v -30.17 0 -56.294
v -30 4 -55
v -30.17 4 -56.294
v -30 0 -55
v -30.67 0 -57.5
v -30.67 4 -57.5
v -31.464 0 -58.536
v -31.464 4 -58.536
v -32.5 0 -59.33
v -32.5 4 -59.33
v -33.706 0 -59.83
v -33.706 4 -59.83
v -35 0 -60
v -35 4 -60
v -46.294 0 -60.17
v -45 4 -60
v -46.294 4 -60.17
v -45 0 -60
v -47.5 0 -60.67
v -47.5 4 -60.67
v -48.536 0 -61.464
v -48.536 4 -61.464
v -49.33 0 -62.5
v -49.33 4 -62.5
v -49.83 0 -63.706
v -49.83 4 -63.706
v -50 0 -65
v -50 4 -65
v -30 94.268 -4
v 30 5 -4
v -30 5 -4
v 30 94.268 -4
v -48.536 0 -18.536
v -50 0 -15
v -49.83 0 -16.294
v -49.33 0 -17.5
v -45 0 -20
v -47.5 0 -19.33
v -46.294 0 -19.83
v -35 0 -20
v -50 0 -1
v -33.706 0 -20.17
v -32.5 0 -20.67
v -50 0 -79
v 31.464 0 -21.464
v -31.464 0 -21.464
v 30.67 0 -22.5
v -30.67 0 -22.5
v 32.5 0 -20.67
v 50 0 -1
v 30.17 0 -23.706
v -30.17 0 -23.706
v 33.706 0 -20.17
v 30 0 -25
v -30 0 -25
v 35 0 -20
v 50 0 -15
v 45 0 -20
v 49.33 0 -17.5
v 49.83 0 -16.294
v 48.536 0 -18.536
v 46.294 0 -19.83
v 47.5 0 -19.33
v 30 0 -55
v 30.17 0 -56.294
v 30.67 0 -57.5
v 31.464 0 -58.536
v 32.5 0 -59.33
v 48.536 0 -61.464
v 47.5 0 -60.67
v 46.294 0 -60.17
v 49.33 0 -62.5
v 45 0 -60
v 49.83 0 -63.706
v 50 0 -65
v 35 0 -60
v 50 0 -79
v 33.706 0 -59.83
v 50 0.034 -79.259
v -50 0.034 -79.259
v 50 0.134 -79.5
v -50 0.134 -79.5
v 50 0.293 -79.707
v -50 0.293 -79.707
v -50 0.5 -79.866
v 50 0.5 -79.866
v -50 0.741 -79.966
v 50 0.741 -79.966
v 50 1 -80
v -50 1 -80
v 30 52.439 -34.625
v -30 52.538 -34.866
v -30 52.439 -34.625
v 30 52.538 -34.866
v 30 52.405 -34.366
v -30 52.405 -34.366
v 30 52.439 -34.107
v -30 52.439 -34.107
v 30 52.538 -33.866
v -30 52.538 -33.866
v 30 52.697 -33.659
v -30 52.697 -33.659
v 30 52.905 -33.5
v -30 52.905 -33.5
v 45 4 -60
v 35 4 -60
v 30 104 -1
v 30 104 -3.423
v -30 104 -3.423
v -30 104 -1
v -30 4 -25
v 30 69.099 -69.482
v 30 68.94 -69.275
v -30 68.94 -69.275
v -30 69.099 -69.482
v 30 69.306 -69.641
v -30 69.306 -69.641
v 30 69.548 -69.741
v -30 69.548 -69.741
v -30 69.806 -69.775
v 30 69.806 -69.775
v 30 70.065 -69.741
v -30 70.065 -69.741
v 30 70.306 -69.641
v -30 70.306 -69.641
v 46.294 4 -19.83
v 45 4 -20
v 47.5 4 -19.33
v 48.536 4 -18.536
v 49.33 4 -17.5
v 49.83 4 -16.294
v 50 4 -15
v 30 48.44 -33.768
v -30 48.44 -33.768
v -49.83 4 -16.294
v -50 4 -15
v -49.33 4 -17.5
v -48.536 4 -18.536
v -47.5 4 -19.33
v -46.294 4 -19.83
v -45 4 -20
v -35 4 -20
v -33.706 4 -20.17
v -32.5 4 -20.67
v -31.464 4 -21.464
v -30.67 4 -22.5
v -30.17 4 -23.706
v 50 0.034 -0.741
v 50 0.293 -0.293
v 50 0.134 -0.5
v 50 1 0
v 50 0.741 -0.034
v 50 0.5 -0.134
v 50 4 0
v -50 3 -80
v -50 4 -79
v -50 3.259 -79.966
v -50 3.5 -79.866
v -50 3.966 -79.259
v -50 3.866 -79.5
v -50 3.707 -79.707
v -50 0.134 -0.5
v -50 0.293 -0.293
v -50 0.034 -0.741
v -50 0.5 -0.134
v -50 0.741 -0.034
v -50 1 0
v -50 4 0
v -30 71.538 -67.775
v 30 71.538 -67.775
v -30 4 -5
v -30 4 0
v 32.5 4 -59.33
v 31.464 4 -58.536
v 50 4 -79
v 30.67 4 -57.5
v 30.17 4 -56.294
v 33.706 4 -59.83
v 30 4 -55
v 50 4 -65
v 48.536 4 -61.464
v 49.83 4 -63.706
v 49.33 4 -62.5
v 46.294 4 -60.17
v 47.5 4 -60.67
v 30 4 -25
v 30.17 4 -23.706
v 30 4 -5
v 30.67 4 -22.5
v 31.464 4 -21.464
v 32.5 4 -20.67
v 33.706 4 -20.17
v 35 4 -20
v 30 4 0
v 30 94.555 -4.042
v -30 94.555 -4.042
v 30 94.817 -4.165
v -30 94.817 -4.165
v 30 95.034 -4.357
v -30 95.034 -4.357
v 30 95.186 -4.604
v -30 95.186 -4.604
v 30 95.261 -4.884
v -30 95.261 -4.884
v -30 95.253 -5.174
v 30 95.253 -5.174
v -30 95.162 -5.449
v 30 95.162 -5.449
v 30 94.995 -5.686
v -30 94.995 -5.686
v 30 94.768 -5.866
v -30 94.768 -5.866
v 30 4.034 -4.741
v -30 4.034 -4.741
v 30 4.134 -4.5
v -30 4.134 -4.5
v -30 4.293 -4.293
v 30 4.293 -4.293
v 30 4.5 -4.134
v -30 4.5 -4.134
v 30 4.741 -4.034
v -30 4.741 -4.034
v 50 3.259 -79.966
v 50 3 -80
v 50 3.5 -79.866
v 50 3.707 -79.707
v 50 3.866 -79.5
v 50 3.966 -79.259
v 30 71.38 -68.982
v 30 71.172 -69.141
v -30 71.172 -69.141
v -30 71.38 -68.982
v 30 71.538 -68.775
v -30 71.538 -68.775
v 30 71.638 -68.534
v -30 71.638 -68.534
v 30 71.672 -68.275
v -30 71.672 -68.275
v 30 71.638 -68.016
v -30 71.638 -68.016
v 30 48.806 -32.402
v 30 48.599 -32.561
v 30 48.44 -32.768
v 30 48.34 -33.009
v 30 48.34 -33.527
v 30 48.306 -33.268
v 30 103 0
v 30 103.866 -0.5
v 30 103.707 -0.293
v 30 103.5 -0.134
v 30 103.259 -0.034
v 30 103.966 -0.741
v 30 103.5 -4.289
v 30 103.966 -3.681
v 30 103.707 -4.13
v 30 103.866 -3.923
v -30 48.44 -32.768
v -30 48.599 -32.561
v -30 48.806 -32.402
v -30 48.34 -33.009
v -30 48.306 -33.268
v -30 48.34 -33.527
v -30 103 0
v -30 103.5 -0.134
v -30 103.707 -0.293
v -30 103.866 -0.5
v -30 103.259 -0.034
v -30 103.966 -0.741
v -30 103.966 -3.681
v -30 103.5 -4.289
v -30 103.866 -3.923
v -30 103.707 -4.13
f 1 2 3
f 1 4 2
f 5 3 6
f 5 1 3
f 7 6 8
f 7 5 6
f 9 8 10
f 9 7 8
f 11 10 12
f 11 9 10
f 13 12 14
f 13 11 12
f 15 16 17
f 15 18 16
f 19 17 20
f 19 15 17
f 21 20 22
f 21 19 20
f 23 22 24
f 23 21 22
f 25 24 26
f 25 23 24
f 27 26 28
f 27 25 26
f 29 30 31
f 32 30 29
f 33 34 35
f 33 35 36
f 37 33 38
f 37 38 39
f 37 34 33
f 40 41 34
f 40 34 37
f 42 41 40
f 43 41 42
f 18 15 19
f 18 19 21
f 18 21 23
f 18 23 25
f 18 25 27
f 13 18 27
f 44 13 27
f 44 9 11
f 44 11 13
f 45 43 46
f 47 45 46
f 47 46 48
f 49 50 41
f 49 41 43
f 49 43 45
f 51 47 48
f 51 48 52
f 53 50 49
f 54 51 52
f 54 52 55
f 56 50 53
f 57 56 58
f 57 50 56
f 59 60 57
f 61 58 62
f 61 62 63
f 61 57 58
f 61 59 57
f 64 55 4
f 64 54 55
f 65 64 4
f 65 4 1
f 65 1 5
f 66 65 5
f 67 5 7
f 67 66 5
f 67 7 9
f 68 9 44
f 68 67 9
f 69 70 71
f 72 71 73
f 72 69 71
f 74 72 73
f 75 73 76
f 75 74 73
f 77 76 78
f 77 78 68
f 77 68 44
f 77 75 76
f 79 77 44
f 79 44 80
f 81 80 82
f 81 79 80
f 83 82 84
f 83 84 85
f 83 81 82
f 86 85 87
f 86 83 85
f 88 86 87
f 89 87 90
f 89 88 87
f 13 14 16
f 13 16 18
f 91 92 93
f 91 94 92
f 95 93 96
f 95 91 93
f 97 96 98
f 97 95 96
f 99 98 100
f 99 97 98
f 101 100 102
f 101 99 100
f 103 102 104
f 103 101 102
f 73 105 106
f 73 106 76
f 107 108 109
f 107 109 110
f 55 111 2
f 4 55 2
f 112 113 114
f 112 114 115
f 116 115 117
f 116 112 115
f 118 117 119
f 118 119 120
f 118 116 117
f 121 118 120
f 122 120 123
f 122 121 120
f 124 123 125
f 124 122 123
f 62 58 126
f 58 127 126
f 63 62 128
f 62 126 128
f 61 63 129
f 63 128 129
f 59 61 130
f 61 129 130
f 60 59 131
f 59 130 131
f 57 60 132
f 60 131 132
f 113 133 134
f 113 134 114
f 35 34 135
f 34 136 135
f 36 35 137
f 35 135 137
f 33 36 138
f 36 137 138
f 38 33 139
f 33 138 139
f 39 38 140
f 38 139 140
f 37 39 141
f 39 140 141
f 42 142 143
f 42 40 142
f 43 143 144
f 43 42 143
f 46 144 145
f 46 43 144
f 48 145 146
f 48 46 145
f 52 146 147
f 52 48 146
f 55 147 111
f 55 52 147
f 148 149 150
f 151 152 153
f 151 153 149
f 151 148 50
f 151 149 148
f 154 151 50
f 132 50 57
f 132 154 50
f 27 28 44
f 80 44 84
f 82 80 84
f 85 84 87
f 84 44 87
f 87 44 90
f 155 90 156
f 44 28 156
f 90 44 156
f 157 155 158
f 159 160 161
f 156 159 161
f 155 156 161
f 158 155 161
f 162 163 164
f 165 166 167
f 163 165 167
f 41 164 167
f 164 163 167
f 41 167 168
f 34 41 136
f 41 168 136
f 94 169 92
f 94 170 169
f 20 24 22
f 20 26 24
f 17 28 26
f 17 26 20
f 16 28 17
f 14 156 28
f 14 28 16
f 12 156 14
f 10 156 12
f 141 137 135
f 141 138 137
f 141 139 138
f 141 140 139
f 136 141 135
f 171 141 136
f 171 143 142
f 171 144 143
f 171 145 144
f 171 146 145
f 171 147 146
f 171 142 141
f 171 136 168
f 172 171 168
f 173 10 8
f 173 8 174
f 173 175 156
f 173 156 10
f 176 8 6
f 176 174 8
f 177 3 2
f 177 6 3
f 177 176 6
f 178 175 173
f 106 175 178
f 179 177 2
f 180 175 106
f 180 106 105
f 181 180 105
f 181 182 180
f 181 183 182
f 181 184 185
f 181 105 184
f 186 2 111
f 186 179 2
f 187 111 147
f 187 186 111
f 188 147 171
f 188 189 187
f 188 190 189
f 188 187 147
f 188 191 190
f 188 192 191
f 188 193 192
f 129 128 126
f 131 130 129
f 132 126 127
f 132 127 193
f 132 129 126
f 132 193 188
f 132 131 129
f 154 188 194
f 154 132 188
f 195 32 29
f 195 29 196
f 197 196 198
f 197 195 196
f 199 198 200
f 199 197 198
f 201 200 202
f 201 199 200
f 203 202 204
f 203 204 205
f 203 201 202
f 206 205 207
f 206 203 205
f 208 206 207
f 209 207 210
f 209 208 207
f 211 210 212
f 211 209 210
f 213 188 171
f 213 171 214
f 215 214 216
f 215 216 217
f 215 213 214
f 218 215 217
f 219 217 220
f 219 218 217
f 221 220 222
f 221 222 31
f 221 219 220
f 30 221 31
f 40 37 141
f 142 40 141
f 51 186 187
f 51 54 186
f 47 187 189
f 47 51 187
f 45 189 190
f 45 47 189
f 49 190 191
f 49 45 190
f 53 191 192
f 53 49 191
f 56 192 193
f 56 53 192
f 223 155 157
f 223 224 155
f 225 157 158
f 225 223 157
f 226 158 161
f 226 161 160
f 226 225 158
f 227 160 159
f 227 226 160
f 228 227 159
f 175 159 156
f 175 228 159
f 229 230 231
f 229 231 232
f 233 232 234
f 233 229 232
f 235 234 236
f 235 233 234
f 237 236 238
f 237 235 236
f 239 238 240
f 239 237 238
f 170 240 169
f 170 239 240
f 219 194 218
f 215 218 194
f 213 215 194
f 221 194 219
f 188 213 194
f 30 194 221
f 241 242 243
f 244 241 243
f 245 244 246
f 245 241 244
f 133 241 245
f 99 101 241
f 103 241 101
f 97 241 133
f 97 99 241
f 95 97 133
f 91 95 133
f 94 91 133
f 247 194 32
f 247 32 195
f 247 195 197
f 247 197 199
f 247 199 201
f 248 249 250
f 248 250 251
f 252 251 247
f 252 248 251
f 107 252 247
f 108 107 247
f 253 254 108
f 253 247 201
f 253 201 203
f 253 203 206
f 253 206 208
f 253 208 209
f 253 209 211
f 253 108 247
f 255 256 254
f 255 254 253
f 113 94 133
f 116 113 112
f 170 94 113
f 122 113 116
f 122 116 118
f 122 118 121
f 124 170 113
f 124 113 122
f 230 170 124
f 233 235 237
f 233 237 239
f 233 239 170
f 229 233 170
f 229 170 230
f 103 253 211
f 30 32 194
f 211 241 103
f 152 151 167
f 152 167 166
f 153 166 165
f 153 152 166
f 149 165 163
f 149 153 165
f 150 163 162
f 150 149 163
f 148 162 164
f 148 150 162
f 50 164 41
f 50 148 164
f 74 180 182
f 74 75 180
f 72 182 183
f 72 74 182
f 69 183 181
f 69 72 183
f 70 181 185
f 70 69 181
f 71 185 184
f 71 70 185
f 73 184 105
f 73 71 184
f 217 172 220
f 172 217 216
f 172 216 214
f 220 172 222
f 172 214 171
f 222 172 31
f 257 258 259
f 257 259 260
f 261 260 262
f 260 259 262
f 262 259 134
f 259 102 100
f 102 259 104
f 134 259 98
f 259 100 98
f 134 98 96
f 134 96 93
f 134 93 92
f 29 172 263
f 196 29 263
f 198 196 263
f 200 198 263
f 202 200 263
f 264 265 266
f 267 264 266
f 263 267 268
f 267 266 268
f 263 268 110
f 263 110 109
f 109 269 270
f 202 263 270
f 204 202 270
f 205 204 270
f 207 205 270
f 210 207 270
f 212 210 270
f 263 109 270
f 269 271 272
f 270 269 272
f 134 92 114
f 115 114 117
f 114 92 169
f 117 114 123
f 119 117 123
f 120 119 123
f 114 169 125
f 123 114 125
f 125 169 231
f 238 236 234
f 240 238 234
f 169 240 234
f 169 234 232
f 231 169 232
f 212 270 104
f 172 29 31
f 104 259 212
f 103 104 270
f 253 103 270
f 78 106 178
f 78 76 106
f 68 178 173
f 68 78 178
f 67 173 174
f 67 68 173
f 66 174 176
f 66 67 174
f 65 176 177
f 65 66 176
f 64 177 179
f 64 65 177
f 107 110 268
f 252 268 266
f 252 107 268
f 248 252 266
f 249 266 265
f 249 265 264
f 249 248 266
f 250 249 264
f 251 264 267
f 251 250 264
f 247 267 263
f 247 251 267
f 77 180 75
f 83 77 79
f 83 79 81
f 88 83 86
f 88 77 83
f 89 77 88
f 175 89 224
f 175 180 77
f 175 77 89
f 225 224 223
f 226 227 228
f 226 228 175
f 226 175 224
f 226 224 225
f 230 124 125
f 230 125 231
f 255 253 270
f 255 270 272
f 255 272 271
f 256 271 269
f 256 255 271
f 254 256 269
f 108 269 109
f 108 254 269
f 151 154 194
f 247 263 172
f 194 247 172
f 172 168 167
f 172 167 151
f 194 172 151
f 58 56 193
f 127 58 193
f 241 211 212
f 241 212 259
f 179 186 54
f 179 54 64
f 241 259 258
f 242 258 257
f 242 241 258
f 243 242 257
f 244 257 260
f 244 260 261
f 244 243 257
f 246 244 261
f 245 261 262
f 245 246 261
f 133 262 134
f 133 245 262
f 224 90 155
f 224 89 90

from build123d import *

# Parameters (mm, degrees)
EXTRUDE_1_DEPTH = 30
EXTRUDE_2_DEPTH = 50
FILLET_1_R      = 5


with BuildPart() as part:
    # 草图1 → 凸台-拉伸1 (new, symmetric)
    with BuildSketch(Plane(origin=(0, 0, 0), x_dir=(0, 0, -1), z_dir=(1, 0, 0))):
        with BuildLine():
            Line((33.5, 52.904501177), (4.288675135, 103.5))
            ThreePointArc((4.288675135, 103.5), (3.922649731, 103.866025404), (3.422649731, 104))
            Line((3.422649731, 104), (1, 104))
            ThreePointArc((1, 104), (0.292893219, 103.707106781), (0, 103))
            Line((0, 103), (0, 1))
            ThreePointArc((0, 1), (0.292893219, 0.292893219), (1, 0))
            Line((1, 0), (79, 0))
            ThreePointArc((79, 0), (79.707106781, 0.292893219), (80, 1))
            Line((80, 1), (80, 3))
            ThreePointArc((80, 3), (79.707106781, 3.707106781), (79, 4))
            Line((79, 4), (5, 4))
            ThreePointArc((5, 4), (4.292893219, 4.292893219), (4, 5))
            Line((4, 5), (4, 94.267949192))
            ThreePointArc((4, 94.267949192), (4.741180955, 95.233875019), (5.866025404, 94.767949192))
            Line((5.866025404, 94.767949192), (32.401923789, 48.806424965))
            ThreePointArc((32.401923789, 48.806424965), (33.009130147, 48.340499139), (33.767949192, 48.440399562))
            Line((33.767949192, 48.440399562), (69.274990748, 68.940399562))
            ThreePointArc((69.274990748, 68.940399562), (69.740916574, 69.54760592), (69.641016151, 70.306424965))
            Line((69.641016151, 70.306424965), (69.141016151, 71.172450369))
            ThreePointArc((69.141016151, 71.172450369), (68.533809793, 71.638376195), (67.774990748, 71.538475773))
            Line((67.774990748, 71.538475773), (34.866025404, 52.538475773))
            ThreePointArc((34.866025404, 52.538475773), (34.107206359, 52.43857535), (33.5, 52.904501177))
        make_face()
    extrude(amount=EXTRUDE_1_DEPTH, both=True)

    # 草图1<4> → 凸台-拉伸2 (add, symmetric)
    with BuildSketch(Plane(origin=(0, 0, 0), x_dir=(0, 0, -1), z_dir=(1, 0, 0))):
        with BuildLine():
            Line((20, 4), (0, 4))
            Line((0, 4), (0, 1))
            ThreePointArc((0, 1), (0.292893219, 0.292893219), (1, 0))
            Line((1, 0), (20, 0))
            Line((20, 0), (20, 4))
        make_face()
        with BuildLine():
            Line((79, 4), (60, 4))
            Line((60, 4), (60, 0))
            Line((60, 0), (79, 0))
            ThreePointArc((79, 0), (79.707106781, 0.292893219), (80, 1))
            Line((80, 1), (80, 3))
            ThreePointArc((80, 3), (79.707106781, 3.707106781), (79, 4))
        make_face()
    extrude(amount=EXTRUDE_2_DEPTH, both=True)

    # 圆角1
    fillet_1_edges = [part.edges().sort_by_distance(p)[0] for p in [
        (-50, 2, -20),
        (-30, 2, -20),
        (-50, 2, -60),
        (-30, 2, -60),
        (50, 2, -20),
        (50, 2, -60),
        (30, 2, -60),
        (30, 2, -20),
    ]]
    fillet(fillet_1_edges, radius=FILLET_1_R)


solid = part.part
